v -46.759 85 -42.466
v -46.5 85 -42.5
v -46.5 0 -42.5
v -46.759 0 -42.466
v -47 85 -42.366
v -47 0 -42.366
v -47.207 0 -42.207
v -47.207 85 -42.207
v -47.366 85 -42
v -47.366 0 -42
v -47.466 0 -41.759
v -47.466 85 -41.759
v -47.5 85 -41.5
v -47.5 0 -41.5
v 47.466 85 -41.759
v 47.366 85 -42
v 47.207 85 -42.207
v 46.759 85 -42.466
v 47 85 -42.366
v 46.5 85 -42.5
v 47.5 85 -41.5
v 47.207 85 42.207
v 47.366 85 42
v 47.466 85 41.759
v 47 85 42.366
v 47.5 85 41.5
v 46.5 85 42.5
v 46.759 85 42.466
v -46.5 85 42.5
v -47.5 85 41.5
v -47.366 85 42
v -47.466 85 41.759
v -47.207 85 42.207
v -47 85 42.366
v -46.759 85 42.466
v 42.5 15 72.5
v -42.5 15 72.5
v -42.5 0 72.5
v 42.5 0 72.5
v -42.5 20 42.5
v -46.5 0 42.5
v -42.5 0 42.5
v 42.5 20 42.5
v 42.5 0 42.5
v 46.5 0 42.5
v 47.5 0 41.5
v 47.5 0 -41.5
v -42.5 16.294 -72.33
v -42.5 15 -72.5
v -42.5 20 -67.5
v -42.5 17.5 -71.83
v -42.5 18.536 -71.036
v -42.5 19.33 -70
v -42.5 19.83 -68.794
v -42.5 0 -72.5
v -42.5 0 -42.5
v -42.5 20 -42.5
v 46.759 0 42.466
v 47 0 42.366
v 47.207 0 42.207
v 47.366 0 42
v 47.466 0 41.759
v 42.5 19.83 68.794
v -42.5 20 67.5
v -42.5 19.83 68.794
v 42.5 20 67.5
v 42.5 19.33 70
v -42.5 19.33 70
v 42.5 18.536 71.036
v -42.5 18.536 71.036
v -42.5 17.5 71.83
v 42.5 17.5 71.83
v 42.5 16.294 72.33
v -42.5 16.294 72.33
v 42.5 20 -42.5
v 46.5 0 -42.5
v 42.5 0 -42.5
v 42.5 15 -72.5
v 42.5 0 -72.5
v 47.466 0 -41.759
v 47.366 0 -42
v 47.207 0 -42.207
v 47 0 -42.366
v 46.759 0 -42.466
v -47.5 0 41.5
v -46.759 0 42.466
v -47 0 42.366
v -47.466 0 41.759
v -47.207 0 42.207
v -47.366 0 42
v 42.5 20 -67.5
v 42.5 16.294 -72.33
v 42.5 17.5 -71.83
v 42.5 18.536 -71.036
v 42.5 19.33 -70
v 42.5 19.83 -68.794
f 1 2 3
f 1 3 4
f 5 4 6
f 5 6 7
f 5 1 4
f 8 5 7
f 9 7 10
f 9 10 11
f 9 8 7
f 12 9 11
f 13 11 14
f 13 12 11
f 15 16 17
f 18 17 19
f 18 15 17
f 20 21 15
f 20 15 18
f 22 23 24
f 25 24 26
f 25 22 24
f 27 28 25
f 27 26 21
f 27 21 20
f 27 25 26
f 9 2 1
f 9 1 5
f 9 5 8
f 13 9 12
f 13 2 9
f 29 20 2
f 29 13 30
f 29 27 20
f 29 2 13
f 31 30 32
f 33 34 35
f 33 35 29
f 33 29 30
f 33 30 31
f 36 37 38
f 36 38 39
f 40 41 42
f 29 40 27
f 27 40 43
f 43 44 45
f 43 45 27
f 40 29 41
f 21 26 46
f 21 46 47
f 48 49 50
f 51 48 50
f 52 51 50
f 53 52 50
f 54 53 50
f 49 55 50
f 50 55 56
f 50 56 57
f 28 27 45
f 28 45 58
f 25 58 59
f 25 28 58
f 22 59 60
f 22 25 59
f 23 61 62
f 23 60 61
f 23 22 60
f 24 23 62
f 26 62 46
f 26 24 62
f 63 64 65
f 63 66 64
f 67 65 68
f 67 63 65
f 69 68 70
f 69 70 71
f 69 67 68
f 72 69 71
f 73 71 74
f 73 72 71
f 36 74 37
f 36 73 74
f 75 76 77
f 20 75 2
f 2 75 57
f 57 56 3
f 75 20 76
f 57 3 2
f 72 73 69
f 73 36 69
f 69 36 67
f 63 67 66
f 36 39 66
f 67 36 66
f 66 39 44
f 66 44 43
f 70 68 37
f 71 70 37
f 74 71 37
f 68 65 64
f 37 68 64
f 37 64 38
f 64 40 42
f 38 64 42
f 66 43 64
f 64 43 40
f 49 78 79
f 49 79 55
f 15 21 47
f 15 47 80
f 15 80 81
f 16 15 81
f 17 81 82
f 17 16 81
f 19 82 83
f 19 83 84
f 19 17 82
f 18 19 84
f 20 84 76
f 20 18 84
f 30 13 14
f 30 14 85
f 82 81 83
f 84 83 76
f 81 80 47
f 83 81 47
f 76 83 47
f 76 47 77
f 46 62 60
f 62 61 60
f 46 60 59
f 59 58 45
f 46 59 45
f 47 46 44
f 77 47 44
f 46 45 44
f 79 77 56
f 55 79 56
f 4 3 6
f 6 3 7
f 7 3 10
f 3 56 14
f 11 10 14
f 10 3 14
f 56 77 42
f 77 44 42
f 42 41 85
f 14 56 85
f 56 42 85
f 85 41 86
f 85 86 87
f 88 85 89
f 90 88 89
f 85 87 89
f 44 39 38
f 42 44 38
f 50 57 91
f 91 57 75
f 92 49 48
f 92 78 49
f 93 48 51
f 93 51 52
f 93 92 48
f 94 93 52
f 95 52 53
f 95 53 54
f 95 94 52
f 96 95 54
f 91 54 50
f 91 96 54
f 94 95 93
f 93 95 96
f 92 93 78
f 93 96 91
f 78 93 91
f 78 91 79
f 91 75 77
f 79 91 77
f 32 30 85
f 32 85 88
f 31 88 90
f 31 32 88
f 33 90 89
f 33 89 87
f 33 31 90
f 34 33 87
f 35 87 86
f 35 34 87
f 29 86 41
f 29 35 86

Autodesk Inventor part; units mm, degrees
ref_plane "YZ Plane" through (0, 0, 0) normal (1, 0, 0) x (0, 1, 0)
ref_plane "XZ Plane" through (0, 0, 0) normal (0, 1, 0) x (-1, 0, 0)
ref_plane "XY Plane" through (0, 0, 0) normal (0, 0, 1) x (1, 0, 0)
sketch "Sketch1" plane through (0, 0, 0) normal (0, 1, 0) x (-1, 0, 0)
  line L0 (47.5, 42.5) -> (-47.5, 42.5)
  line L1 (-47.5, 42.5) -> (-47.5, -42.5)
  line L2 (-47.5, -42.5) -> (47.5, -42.5)
  line L3 (47.5, -42.5) -> (47.5, 42.5)
  line L4 (47.5, 42.5) -> (-47.5, -42.5) construction
  line L5 (-47.5, 42.5) -> (47.5, -42.5) construction
  point P0 (0, 0)
  dimension "d0" = 95
  dimension "d1" = 85
extrude "Extrusion1" add sketch "Sketch1" along normal blind 85
fillet "Face Fillet1" radius 1 1 edges at (47.5, 42.5, 42.5)
fillet "Face Fillet2" radius 1 1 edges at (47.5, 42.5, -42.5)
fillet "Face Fillet3" radius 1 1 edges at (-47.5, 42.5, -42.5)
fillet "Face Fillet4" radius 1 1 edges at (-47.5, 42.5, 42.5)
sketch "Sketch2" plane through (46.5, 0, -42.5) normal (0, 0, -1) x (-1, 0, 0)
  line L0 (89, 0) -> (89, 20)
  line L1 (89, 20) -> (4, 20)
  line L2 (4, 20) -> (4, 0)
  line L3 (89, 0) -> (4, 0)
  point P0 (46.5, 0)
  point P1 (94, 0)
  dimension "d9" = 20
  dimension "d10" = 85
extrude "Extrusion2" add sketch "Sketch2" along normal blind 30
mirror "Mirror1" about plane through (0, 0, 0) normal (0, 0, 1) of "Extrusion2"
fillet "Face Fillet5" radius 5 1 edges at (0, 20, 72.5)
fillet "Face Fillet6" radius 5 1 edges at (0, 20, -72.5)
sketch "Sketch3" plane through (-47.5, 0, -41.5) normal (-1, 0, 0) x (0, 0, 1)
  point P0 (41.5, 0)
properties part number "base_of_linear_motor"
